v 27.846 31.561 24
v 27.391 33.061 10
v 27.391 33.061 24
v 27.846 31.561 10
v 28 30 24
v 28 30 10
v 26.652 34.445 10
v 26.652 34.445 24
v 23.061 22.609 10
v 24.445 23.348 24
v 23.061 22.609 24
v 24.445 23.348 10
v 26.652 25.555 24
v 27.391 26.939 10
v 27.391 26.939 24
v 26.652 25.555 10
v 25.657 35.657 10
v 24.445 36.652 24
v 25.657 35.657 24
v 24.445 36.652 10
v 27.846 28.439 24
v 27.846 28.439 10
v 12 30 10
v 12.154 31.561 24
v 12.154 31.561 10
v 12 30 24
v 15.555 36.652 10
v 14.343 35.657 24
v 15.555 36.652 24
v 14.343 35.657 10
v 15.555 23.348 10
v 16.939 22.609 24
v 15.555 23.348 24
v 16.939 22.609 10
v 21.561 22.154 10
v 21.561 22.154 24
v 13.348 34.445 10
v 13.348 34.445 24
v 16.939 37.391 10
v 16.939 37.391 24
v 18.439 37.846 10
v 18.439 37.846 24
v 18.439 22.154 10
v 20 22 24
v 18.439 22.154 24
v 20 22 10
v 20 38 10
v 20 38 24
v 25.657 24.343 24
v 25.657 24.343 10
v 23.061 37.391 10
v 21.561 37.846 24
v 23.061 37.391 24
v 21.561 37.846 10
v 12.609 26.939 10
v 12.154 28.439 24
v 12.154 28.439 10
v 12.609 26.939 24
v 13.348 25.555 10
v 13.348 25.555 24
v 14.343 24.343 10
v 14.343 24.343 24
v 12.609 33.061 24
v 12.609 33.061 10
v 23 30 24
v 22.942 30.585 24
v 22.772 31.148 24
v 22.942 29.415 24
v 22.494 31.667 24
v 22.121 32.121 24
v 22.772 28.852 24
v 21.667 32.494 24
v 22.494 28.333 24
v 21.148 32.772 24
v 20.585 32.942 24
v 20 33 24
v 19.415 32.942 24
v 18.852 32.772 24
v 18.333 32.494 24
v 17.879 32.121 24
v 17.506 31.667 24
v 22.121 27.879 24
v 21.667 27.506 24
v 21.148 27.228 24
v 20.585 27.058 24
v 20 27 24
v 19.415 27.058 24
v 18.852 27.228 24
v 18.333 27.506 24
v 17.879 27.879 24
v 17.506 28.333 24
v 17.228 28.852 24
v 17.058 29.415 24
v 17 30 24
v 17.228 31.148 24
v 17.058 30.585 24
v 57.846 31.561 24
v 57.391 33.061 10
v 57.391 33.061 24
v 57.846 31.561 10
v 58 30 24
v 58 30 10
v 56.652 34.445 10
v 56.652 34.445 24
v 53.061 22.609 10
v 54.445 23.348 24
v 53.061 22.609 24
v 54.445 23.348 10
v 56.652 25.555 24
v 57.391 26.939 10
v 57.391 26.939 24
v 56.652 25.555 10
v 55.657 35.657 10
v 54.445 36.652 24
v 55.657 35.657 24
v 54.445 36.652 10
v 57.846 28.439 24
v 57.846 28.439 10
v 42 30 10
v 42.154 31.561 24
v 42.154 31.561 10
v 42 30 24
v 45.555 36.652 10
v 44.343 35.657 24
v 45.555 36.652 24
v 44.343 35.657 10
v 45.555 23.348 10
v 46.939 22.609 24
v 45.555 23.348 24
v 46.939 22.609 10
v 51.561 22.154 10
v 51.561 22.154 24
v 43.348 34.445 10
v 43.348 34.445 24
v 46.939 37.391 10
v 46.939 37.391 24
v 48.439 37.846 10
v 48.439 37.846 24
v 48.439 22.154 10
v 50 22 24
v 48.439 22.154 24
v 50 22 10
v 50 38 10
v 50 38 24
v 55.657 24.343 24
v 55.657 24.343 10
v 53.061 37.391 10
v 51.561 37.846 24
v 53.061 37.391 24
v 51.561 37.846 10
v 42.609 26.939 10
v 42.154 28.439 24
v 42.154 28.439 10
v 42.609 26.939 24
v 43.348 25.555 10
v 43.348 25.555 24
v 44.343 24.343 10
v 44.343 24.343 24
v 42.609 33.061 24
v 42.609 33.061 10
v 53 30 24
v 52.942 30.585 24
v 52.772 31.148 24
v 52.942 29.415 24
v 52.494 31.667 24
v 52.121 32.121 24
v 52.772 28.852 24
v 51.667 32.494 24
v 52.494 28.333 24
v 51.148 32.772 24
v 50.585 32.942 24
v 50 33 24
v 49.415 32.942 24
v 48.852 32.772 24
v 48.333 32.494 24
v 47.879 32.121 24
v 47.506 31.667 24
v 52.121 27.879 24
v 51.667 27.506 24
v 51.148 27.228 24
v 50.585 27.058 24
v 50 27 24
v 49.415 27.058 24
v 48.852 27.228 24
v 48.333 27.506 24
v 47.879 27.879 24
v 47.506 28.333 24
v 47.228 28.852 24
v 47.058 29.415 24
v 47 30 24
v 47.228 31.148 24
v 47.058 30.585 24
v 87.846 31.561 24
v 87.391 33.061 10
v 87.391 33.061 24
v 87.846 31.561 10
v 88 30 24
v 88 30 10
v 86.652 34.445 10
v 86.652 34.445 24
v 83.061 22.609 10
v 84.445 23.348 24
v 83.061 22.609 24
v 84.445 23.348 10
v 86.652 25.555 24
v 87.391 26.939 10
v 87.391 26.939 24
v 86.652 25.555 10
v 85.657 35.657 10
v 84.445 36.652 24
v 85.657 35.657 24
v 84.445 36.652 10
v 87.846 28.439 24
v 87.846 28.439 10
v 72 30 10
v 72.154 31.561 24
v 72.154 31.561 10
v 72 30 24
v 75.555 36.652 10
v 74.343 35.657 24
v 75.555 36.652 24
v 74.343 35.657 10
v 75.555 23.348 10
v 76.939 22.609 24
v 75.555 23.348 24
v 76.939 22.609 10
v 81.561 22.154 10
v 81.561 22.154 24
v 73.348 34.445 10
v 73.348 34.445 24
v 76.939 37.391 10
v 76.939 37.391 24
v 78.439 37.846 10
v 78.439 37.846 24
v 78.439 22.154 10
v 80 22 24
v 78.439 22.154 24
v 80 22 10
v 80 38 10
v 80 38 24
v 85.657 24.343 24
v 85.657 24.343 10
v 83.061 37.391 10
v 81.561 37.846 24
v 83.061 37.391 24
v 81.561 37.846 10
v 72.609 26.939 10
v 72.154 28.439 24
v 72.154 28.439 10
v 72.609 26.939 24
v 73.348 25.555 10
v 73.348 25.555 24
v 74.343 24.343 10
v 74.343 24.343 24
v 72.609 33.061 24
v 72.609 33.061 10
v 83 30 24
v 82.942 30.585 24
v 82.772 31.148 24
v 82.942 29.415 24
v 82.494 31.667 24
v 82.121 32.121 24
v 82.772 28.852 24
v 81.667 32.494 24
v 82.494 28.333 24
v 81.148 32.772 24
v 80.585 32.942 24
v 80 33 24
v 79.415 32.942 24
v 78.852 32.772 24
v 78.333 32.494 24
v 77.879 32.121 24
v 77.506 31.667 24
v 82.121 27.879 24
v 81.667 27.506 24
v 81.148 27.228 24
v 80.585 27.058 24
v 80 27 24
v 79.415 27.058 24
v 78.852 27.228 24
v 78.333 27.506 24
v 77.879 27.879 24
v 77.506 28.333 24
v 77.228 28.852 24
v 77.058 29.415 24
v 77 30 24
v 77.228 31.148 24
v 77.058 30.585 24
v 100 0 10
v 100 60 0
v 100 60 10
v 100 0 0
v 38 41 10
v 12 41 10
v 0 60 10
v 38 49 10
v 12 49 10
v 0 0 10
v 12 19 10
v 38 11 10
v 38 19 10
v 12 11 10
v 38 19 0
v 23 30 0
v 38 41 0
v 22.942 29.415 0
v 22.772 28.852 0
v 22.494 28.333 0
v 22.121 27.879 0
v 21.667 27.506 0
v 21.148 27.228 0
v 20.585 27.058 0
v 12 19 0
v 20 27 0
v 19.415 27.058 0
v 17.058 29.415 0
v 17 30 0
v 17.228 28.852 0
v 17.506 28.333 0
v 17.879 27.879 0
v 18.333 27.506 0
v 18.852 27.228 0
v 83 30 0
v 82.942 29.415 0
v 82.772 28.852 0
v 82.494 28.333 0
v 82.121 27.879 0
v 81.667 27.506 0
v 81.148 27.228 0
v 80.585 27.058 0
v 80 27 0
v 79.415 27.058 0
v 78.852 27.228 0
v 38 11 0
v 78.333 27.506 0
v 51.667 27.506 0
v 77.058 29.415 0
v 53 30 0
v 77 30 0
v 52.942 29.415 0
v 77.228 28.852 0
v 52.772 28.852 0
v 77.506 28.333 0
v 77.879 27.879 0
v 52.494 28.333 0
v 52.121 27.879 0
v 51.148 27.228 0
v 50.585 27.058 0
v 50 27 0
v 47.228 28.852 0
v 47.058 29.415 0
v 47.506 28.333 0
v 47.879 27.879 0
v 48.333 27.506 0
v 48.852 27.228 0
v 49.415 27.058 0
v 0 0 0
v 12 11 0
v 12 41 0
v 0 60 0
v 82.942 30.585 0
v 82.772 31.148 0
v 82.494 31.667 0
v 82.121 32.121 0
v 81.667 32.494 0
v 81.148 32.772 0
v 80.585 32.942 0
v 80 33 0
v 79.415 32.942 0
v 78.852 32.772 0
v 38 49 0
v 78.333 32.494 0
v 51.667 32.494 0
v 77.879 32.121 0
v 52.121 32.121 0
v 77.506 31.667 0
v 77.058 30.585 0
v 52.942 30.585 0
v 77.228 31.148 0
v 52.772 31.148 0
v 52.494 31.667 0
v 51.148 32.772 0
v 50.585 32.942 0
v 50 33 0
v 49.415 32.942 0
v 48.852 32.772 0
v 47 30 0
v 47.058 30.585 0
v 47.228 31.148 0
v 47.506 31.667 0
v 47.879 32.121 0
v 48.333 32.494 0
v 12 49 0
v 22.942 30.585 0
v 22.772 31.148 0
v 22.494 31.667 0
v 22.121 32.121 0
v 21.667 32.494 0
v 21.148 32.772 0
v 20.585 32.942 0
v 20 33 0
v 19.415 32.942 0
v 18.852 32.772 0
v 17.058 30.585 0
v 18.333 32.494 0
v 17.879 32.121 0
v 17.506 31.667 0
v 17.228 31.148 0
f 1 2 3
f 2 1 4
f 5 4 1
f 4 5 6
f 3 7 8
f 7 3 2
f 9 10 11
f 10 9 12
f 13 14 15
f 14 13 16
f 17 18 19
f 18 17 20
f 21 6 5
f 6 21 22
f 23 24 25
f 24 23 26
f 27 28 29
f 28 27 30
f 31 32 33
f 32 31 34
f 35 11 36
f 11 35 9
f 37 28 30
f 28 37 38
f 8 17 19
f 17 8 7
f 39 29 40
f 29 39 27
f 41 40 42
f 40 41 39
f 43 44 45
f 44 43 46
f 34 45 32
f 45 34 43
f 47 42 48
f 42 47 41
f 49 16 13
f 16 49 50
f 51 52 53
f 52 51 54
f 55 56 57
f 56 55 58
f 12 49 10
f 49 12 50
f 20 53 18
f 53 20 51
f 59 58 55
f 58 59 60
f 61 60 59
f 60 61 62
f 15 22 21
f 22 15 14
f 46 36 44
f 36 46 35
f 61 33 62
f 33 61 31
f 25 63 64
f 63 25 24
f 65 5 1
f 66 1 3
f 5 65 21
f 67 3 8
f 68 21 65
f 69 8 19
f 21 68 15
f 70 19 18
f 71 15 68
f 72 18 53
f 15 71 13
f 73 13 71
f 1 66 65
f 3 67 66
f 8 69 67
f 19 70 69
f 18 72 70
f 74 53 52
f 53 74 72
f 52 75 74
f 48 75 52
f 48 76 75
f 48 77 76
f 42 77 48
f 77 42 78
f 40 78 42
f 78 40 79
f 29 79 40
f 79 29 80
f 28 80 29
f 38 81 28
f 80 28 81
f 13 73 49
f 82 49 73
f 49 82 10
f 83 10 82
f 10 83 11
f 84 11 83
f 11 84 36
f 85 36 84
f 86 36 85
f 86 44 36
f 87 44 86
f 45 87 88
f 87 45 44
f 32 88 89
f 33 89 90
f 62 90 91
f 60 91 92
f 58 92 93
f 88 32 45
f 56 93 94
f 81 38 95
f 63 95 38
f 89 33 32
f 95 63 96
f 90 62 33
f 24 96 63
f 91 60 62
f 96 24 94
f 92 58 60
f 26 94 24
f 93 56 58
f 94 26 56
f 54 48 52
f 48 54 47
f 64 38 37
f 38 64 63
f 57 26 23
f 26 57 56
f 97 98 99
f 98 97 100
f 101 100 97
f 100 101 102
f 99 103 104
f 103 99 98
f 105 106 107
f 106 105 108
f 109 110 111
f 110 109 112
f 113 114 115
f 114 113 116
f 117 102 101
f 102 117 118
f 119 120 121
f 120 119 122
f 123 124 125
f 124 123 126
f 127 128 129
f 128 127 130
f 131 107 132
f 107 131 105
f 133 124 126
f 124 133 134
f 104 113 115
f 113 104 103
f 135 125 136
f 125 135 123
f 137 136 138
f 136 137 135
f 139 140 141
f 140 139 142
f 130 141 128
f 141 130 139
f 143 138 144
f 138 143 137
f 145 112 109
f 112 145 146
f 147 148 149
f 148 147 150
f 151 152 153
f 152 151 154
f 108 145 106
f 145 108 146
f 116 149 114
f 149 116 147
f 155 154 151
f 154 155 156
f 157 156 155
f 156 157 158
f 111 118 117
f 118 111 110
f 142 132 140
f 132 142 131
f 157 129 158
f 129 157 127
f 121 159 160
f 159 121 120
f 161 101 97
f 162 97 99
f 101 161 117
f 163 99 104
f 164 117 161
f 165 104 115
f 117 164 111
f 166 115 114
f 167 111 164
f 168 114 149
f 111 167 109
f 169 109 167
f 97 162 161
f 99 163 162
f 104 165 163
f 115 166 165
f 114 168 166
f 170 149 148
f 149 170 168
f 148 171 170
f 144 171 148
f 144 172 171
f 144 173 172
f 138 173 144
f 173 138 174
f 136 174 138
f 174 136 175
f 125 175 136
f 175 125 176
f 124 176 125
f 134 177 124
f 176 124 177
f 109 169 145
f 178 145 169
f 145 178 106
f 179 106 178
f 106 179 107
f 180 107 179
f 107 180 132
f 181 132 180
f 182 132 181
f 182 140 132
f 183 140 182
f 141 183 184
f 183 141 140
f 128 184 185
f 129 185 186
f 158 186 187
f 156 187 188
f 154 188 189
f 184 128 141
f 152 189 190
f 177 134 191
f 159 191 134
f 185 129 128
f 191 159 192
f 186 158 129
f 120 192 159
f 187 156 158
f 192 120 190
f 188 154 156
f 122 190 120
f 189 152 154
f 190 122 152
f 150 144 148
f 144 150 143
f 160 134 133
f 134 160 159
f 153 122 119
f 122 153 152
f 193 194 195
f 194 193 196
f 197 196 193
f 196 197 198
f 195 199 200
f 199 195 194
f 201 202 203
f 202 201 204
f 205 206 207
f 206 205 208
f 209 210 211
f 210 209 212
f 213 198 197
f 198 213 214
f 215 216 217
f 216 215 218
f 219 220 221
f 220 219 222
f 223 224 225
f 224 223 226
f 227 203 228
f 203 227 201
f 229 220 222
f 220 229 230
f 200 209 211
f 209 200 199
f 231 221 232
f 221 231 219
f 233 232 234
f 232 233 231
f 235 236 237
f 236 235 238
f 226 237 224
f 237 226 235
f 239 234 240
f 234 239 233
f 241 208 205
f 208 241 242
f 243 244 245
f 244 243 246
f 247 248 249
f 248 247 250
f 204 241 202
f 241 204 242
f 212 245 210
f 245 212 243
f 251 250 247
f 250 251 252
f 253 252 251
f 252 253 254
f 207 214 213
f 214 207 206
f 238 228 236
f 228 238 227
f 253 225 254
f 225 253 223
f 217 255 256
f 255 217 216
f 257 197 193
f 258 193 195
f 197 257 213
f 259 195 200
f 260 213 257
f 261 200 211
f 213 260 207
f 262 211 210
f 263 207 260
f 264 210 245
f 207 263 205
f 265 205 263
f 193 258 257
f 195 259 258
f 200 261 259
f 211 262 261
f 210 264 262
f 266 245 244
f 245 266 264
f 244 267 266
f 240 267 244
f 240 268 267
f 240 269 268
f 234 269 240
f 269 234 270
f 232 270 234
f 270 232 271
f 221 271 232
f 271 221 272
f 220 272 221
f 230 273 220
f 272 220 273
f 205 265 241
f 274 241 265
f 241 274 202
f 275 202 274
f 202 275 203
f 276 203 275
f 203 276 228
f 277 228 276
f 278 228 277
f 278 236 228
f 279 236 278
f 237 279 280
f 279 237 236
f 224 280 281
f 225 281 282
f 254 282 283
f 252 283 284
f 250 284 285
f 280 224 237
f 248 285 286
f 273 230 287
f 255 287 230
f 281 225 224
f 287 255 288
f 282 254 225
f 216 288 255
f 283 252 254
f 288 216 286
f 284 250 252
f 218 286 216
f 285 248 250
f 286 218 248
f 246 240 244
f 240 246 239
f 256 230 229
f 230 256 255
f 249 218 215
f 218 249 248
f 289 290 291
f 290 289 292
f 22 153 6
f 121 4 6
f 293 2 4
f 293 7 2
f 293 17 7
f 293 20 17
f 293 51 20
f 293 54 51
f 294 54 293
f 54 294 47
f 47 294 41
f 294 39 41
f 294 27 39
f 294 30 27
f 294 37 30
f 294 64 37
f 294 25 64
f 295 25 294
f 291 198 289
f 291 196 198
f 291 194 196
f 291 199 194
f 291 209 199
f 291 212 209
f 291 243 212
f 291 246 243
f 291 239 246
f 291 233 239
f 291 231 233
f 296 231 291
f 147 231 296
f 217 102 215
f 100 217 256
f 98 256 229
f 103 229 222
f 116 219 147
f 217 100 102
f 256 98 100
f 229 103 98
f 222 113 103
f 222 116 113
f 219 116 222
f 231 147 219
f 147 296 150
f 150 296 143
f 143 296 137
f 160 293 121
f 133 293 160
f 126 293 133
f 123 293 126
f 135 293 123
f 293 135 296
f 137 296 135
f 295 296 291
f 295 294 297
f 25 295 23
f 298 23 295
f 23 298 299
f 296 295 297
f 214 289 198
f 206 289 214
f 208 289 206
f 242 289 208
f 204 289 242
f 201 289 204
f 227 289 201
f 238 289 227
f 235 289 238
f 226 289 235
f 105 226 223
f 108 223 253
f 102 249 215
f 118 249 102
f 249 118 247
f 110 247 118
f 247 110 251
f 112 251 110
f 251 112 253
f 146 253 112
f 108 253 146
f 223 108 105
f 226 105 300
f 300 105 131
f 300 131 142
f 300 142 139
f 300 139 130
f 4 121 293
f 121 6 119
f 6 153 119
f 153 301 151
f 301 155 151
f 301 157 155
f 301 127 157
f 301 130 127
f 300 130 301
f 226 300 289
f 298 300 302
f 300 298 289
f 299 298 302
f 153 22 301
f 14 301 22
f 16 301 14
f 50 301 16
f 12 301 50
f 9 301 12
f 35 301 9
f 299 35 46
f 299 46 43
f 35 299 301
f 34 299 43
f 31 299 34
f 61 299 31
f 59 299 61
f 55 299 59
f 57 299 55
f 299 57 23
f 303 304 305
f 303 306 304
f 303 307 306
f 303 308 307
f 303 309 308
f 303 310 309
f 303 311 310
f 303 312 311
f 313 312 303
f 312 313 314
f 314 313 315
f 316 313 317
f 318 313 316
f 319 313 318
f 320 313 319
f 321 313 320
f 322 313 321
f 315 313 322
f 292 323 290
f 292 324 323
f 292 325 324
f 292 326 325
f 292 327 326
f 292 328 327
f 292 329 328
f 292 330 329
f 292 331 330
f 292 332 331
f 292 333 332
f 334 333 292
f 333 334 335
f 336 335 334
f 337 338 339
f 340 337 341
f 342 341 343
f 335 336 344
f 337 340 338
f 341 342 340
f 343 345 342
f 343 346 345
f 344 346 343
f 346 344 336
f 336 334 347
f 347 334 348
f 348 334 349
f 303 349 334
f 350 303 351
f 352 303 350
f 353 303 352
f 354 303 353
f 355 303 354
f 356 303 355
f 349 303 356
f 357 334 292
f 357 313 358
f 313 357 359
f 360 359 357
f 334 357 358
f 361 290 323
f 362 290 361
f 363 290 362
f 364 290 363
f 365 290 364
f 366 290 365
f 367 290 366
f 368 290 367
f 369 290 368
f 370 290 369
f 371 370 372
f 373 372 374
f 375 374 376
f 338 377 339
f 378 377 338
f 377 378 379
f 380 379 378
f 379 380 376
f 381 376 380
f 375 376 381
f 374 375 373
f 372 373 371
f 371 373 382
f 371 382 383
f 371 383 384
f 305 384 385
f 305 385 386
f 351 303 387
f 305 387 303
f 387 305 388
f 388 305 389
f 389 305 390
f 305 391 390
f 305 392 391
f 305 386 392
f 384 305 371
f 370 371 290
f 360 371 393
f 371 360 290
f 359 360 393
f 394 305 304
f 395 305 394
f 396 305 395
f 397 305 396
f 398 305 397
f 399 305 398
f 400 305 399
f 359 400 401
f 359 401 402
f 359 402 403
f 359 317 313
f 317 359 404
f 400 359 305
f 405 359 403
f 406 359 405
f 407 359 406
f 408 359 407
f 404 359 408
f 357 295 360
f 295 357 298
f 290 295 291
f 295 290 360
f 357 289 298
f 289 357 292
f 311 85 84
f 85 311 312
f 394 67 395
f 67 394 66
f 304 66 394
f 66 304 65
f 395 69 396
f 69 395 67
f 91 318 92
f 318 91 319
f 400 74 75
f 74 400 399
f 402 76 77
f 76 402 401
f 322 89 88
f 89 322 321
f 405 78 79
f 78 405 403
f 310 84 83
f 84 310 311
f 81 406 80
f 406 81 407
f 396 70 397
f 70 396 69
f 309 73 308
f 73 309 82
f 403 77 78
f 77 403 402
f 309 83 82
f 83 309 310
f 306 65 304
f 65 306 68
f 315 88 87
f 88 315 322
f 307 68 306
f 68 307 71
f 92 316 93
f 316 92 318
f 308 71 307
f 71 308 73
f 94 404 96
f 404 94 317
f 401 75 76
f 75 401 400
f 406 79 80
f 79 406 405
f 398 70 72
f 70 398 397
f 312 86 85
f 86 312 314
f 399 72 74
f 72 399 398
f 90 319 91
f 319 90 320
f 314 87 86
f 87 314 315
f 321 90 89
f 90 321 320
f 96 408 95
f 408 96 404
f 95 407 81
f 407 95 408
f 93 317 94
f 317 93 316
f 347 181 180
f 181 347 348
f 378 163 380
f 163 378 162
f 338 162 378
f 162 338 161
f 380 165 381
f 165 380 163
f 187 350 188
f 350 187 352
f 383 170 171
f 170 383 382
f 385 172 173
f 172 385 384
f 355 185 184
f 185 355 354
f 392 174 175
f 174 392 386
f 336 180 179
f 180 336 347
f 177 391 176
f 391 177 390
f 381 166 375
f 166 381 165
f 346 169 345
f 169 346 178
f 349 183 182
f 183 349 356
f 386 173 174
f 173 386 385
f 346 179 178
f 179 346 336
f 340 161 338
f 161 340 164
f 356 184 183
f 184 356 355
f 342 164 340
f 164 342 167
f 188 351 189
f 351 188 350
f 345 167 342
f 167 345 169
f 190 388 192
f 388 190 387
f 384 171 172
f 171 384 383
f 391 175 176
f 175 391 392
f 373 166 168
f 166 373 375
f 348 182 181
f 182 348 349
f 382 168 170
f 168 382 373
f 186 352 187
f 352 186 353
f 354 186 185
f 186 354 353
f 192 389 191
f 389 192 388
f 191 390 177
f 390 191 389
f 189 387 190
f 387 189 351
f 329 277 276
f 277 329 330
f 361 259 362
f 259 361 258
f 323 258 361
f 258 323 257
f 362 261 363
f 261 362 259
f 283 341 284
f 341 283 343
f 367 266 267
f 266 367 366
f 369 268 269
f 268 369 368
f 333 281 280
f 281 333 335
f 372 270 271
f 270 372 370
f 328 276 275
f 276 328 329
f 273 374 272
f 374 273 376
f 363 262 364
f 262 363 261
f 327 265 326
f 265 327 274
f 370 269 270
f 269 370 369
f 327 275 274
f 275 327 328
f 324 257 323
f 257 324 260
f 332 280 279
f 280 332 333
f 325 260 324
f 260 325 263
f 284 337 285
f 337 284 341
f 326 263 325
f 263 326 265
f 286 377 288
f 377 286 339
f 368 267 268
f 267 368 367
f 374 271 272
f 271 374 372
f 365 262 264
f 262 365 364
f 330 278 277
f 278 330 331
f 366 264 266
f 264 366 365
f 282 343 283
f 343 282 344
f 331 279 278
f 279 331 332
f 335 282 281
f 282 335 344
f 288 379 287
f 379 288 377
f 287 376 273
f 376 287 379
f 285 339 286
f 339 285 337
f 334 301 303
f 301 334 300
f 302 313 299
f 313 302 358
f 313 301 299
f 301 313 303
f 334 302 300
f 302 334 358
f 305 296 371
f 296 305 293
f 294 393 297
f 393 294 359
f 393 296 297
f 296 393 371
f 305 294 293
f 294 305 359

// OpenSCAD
$fn = 32;

// ----------------------------------------------------------------------
// Drill jig: three_boss_slot jig
// ----------------------------------------------------------------------

// --- parameters (mm) ---
plate_l = 100;            // plate length, X
plate_w = 60;             // plate width, Y
plate_t = 10;             // plate thickness
boss_d = 16;              // guide boss diameter
boss_h = 15;              // boss height above the plate
guide_d = 6;              // guide hole diameter
boss_pitch = 30;          // boss pitch
slot_w = 8;               // clamp slot width
slot_l = 26;              // clamp slot length
slot_x = 12;              // slot start X

n_boss = 3;  // guide bosses
boss_x0 = (plate_l - (n_boss - 1) * boss_pitch) / 2;  // first boss X
boss_top = plate_t - 1 + boss_h;  // boss crown height
total_h = boss_top;  // overall height

difference() {
  union() {
  cube([plate_l, plate_w, plate_t]);
  for (i = [0 : n_boss - 1])
    translate([boss_x0 + i * boss_pitch, plate_w / 2, plate_t - 1])
      cylinder(h = boss_h, d = boss_d);
  }
  for (i = [0 : n_boss - 1])
    translate([boss_x0 + i * boss_pitch, plate_w / 2, -1])
      cylinder(h = plate_t + boss_h, d = guide_d);
  for (cy = [plate_w * 0.25, plate_w * 0.75])
    translate([slot_x, cy - slot_w / 2, -1])
      cube([slot_l, slot_w, plate_t + 2]);
}
